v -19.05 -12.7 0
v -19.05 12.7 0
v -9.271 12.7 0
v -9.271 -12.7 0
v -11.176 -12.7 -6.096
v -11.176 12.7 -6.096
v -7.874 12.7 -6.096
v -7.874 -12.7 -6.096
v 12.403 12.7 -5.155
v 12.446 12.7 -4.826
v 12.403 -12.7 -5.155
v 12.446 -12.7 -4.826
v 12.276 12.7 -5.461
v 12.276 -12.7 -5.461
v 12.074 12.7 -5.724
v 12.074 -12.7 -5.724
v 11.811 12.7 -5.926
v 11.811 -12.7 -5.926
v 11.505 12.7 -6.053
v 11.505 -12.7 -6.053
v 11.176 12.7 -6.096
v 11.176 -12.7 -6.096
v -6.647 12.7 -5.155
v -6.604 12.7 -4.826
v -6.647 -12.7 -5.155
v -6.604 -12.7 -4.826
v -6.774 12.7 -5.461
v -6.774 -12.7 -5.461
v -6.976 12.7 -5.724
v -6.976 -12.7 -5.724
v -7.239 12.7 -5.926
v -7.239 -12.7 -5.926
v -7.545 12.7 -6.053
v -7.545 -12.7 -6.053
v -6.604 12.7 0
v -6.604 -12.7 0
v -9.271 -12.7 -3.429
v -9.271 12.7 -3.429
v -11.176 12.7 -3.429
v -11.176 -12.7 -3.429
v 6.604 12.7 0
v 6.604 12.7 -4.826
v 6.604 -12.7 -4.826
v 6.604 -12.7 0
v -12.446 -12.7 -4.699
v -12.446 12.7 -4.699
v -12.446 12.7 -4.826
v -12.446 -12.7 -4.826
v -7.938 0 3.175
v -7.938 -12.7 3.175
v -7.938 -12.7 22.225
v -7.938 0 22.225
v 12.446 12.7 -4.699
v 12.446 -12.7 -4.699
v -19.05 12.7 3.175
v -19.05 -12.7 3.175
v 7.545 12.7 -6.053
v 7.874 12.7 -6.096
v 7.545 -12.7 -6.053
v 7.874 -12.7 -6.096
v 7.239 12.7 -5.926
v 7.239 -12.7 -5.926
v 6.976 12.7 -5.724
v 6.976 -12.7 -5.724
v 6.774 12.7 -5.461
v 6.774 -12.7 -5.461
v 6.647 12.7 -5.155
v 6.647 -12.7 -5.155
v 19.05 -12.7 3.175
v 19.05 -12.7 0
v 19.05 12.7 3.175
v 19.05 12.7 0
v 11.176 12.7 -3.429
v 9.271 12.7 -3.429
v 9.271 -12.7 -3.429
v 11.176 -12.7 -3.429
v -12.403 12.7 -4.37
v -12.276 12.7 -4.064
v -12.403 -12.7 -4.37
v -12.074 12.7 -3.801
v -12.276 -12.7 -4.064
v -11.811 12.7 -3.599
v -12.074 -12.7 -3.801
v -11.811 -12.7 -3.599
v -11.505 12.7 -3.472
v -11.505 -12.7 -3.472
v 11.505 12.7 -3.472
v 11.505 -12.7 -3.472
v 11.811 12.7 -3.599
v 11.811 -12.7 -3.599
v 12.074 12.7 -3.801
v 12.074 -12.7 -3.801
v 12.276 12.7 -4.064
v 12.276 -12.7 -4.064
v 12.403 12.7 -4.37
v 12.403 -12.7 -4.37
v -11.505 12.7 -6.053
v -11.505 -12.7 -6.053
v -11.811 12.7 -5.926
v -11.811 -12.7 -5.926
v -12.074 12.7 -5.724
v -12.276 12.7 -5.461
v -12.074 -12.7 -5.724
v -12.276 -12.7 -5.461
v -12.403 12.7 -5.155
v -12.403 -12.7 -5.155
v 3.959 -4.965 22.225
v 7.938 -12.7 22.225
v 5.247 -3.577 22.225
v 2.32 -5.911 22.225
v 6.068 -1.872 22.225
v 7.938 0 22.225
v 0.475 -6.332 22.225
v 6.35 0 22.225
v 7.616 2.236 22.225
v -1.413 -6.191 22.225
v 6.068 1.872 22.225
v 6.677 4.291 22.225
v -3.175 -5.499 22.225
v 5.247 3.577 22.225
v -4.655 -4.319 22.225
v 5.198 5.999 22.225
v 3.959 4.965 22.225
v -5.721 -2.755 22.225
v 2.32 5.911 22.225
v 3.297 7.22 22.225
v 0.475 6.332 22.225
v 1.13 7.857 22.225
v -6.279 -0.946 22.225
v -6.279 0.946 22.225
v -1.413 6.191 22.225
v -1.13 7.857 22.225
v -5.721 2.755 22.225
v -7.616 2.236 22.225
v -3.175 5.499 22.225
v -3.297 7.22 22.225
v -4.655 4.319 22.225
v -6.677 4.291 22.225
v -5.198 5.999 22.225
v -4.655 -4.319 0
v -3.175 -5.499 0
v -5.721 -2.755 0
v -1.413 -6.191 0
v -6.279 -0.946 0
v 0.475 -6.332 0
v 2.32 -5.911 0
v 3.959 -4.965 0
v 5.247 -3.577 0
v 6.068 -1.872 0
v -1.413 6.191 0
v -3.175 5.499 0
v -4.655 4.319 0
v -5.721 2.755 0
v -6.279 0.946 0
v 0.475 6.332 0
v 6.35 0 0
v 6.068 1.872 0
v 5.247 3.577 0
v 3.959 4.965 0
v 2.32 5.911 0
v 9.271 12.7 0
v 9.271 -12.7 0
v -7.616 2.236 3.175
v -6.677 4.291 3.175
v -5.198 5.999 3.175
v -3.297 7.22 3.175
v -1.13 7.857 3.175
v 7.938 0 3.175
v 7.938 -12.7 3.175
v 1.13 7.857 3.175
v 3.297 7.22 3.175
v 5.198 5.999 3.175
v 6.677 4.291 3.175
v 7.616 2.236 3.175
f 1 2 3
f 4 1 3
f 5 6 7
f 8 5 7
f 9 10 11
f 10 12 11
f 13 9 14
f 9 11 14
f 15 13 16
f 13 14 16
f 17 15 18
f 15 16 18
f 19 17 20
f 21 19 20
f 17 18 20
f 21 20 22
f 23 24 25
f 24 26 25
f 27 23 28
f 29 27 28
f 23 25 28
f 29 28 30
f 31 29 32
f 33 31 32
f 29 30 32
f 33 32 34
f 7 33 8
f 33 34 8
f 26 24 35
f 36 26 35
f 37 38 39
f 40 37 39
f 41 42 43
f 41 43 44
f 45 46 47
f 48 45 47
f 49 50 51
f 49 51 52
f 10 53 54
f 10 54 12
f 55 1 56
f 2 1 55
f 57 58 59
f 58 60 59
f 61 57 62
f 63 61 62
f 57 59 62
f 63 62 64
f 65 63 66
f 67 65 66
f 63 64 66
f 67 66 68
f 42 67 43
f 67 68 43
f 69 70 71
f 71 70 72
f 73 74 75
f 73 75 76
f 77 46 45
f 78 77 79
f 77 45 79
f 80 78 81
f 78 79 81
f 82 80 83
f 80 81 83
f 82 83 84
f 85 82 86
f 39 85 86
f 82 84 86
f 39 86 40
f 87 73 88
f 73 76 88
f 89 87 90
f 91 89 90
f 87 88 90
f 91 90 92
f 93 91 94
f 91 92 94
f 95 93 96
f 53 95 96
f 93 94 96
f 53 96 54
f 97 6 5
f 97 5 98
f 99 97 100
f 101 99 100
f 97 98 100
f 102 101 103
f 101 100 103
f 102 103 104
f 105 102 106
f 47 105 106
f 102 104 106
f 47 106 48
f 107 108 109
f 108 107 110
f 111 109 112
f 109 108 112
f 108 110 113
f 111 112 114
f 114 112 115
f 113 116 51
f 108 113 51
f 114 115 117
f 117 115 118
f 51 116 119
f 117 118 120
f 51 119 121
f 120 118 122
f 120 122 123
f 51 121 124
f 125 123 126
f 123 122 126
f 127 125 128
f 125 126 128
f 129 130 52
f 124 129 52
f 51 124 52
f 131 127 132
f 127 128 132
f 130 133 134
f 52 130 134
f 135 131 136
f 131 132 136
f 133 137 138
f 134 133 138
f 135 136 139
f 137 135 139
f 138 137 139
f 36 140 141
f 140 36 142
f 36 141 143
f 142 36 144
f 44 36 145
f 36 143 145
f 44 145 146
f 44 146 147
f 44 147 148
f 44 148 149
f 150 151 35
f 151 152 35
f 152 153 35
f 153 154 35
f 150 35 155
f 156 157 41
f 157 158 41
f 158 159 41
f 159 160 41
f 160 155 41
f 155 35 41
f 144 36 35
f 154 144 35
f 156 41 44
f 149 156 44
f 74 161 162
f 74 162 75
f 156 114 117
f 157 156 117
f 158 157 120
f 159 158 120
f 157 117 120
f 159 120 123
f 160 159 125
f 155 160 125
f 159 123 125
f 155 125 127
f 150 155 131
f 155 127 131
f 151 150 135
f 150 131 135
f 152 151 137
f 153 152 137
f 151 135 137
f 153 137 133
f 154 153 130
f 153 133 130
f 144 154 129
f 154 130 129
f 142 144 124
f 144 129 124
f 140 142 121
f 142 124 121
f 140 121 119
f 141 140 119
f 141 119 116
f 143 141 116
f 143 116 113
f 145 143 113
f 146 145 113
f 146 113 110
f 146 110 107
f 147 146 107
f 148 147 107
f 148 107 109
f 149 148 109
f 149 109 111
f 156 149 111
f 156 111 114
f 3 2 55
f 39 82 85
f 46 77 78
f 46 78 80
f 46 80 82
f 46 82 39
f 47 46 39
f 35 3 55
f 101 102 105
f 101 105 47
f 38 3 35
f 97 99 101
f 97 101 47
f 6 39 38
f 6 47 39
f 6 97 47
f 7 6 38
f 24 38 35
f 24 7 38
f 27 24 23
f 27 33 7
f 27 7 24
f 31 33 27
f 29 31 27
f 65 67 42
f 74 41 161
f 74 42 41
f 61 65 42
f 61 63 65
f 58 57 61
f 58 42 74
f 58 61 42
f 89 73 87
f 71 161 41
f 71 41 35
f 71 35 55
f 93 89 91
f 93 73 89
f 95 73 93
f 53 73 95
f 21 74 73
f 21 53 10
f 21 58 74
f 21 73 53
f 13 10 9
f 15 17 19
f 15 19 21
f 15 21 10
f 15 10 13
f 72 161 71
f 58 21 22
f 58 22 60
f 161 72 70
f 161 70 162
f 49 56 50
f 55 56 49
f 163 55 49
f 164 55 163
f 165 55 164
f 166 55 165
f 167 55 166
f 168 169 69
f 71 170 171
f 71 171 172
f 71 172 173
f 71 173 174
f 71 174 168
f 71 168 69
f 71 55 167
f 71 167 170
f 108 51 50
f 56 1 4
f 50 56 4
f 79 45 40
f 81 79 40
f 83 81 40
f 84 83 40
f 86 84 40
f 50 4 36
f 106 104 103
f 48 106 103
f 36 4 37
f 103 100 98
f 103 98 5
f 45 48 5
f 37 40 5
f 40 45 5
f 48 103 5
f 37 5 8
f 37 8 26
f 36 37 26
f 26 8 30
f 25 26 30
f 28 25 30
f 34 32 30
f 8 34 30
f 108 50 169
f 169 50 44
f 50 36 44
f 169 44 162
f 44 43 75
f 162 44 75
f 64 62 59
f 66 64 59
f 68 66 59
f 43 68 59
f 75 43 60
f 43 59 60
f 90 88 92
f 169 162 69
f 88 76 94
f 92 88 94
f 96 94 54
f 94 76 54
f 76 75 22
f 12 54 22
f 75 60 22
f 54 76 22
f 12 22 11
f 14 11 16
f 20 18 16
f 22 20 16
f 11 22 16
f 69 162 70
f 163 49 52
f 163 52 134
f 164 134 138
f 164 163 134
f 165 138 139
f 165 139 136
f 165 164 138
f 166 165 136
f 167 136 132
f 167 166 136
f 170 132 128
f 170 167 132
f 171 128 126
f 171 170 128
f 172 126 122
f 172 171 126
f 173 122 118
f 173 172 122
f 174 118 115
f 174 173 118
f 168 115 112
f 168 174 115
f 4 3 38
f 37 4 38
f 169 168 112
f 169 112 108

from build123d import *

# Parameters (mm, degrees)
SKETCH1_W           = 38.1
SKETCH1_H           = 25.4
BOSS_EXTRUDE1_DEPTH = 3.175
SKETCH2_W           = 25.4
SKETCH2_H           = 25.4
BOSS_EXTRUDE2_DEPTH = 6.35
CUT_EXTRUDE1_REACH  = 34.379
SKETCH3_W           = 3.175
SKETCH3_H           = 3.175
SKETCH3_W_2         = 6.35
SKETCH3_H_2         = 6.35
CUT_EXTRUDE2_REACH  = 34.379
FILLET1_R           = 1.27
BOSS_EXTRUDE3_DEPTH = 19.05
CUT_EXTRUDE3_REACH  = 38.418
SKETCH6_R           = 6.35


with BuildPart() as part:
    # Sketch1 → Boss-Extrude1 (new body)
    with BuildSketch(Plane.XY):
        Rectangle(SKETCH1_W, SKETCH1_H)
    extrude(amount=BOSS_EXTRUDE1_DEPTH)

    # Sketch2 → Boss-Extrude2 (add)
    with BuildSketch(Plane(origin=(0, 0, 0), x_dir=(-1, 0, 0), z_dir=(0, 0, -1))):
        Rectangle(SKETCH2_W, SKETCH2_H)
    extrude(amount=BOSS_EXTRUDE2_DEPTH)

    # Sketch3 → Cut-Extrude1 (cut, up to next)
    with BuildSketch(Plane(origin=(0, 12.7, 0), x_dir=(1, 0, 0), z_dir=(0, 1, 0)), mode=Mode.PRIVATE) as cut_extrude1_sk1:
        with Locations((11.1125, 1.5875)):
            Rectangle(SKETCH3_W, SKETCH3_H)
    cut_extrude1_tool1 = extrude(cut_extrude1_sk1.sketch, amount=-CUT_EXTRUDE1_REACH, mode=Mode.PRIVATE) & part.part
    # Sketch3 → Cut-Extrude1 (cut, up to next)
    with BuildSketch(Plane(origin=(0, 12.7, 0), x_dir=(1, 0, 0), z_dir=(0, 1, 0)), mode=Mode.PRIVATE) as cut_extrude1_sk2:
        with Locations((3.175, 3.175)):
            Rectangle(SKETCH3_W_2, SKETCH3_H_2)
    cut_extrude1_tool2 = extrude(cut_extrude1_sk2.sketch, amount=-CUT_EXTRUDE1_REACH, mode=Mode.PRIVATE) & part.part
    cut_extrude1_1 = cut_extrude1_tool1.solids().sort_by_distance((11.1125, 12.7, -1.5875))[0]
    add(cut_extrude1_1, mode=Mode.SUBTRACT)
    cut_extrude1_2 = cut_extrude1_tool2.solids().sort_by_distance((3.175, 12.7, -3.175))[0]
    add(cut_extrude1_2, mode=Mode.SUBTRACT)
    cut_extrude1 = cut_extrude1_1 + cut_extrude1_2  # Cut-Extrude1 as one shape, for the pattern or mirror that repeats it

    # Sketch4 → Cut-Extrude2 (cut, up to next)
    with BuildSketch(Plane(origin=(0, 12.7, 0), x_dir=(1, 0, 0), z_dir=(0, 1, 0)), mode=Mode.PRIVATE) as cut_extrude2_sk1:
        Polygon((6.604, 0), (6.35, 0), (6.35, 6.35), (12.7, 6.35), (12.7, 3.175), (9.525, 3.175), (9.525, 0), (9.271, 0), (9.271, 3.429), (12.446, 3.429), (12.446, 6.096), (6.604, 6.096), align=None)
    cut_extrude2_tool1 = extrude(cut_extrude2_sk1.sketch, amount=-CUT_EXTRUDE2_REACH, mode=Mode.PRIVATE) & part.part
    cut_extrude2 = cut_extrude2_tool1.solids().sort_by_distance((6.477, 12.7, -0.089803))[0]
    add(cut_extrude2, mode=Mode.SUBTRACT)

    # Mirror1: Cut-Extrude1, Cut-Extrude2 across plane
    add(cut_extrude1.mirror(Plane.ZY), mode=Mode.SUBTRACT)
    add(cut_extrude2.mirror(Plane.ZY), mode=Mode.SUBTRACT)

    # Fillet1
    fillet1_edges = [part.edges().sort_by_distance(p)[0] for p in [
        (-6.604, 0, -6.096),
        (-12.446, 0, -6.096),
        (-12.446, 0, -3.429),
        (12.446, 0, -3.429),
        (12.446, 0, -6.096),
        (6.604, 0, -6.096),
    ]]
    fillet(fillet1_edges, radius=FILLET1_R)

    # Sketch5 → Boss-Extrude3 (add)
    with BuildSketch(Plane.XY.offset(3.175)):
        with BuildLine():
            Line((7.9375, 0), (7.9375, -12.7))
            Line((7.9375, -12.7), (-7.9375, -12.7))
            Line((-7.9375, -12.7), (-7.9375, 0))
            ThreePointArc((-7.9375, 0), (0, 7.9375), (7.9375, 0))
        make_face()
    extrude(amount=BOSS_EXTRUDE3_DEPTH)

    # Sketch6 → Cut-Extrude3 (cut, up to next)
    with BuildSketch(Plane.XY.offset(22.225), mode=Mode.PRIVATE) as cut_extrude3_sk1:
        Circle(SKETCH6_R)
    cut_extrude3_tool1 = extrude(cut_extrude3_sk1.sketch, amount=-CUT_EXTRUDE3_REACH, mode=Mode.PRIVATE) & part.part
    add(cut_extrude3_tool1.solids().sort_by_distance((0, 0, 22.225))[0], mode=Mode.SUBTRACT)


solid = part.part
